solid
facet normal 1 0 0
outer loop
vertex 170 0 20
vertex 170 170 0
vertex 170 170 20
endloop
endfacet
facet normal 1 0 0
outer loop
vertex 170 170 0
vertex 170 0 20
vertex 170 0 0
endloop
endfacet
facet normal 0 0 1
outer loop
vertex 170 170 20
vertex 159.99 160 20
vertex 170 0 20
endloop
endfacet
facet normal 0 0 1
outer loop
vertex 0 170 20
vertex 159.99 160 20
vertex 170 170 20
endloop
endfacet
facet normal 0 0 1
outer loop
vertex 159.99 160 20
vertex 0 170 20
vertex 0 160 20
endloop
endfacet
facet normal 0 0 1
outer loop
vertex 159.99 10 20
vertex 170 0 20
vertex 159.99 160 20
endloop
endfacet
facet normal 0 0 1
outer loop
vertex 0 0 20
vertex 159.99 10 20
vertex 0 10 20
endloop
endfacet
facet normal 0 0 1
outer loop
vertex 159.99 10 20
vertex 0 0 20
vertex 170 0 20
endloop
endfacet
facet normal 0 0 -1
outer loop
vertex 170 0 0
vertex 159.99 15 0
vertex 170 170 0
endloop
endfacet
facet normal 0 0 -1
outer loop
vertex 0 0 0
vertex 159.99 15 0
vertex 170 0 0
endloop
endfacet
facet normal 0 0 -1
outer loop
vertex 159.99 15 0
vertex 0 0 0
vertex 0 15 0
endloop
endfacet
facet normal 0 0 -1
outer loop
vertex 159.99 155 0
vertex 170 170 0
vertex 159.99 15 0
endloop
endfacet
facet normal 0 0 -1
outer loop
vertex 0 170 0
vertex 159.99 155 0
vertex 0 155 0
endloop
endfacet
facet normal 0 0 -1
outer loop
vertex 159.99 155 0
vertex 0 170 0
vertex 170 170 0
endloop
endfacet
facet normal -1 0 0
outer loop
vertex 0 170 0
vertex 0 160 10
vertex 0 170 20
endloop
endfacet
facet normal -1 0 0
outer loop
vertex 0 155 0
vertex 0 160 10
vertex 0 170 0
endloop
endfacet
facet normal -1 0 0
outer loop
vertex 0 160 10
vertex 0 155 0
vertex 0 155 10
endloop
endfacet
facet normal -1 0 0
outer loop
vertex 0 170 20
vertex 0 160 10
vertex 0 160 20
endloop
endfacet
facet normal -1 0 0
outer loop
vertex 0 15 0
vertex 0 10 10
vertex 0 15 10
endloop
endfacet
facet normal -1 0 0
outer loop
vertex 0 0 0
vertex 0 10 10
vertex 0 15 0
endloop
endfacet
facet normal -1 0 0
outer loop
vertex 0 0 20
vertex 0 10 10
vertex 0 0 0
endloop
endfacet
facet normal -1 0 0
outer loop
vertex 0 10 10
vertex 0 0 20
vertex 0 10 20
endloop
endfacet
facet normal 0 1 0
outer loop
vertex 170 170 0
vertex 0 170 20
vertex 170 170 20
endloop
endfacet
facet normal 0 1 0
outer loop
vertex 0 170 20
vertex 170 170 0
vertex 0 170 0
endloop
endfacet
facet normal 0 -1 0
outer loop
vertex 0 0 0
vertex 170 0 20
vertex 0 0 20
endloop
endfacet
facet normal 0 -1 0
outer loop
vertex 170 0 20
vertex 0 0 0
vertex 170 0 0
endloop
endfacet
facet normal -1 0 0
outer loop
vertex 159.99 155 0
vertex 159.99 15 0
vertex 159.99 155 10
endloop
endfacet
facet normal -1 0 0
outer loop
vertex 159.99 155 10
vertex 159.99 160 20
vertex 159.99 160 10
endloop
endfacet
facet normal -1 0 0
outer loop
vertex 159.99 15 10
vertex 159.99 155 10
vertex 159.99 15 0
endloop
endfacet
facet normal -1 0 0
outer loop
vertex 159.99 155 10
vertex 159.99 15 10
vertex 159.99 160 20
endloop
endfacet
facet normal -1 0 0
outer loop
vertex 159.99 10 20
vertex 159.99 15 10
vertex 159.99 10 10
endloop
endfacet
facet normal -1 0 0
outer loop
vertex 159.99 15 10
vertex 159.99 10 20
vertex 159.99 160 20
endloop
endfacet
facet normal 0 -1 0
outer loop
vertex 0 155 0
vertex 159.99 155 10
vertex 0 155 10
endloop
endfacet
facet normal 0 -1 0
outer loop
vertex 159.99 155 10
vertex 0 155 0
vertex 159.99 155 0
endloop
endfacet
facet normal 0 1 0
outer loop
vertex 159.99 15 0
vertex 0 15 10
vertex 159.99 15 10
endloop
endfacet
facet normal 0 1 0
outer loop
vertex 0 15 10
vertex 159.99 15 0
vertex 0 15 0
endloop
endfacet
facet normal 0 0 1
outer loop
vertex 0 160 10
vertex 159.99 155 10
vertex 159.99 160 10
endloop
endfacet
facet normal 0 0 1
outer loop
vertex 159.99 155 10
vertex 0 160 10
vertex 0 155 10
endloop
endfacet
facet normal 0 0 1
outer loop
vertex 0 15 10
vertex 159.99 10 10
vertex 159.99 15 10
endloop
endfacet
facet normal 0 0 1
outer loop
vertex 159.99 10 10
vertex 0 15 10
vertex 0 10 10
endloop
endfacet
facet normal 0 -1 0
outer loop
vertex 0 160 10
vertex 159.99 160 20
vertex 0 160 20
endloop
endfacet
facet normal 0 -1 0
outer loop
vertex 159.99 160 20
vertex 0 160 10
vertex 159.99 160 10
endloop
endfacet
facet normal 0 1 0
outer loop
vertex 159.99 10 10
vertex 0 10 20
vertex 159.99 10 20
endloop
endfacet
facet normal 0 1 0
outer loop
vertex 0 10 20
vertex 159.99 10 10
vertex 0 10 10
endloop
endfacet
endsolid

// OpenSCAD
$fa = 1;
$fs = 0.04;

e = 0.01;


module film_holder_seat(
    external_width,
    external_depth,
    external_height,
    film_holder_width,
    film_holder_depth,
    film_holder_height
) {
    rabbet_width = film_holder_width;
    rabbet_depth = film_holder_depth + 10;
    rabbet_height = 4;

    difference() {
        // main outer dimension of the holder seat
        cube([external_width, external_depth, 20]);

        // cut away the slot that the film holder will rest in
        translate([-e, (external_depth - film_holder_depth) / 2, -e])
            cube([film_holder_width, film_holder_depth, external_height + e]);

        // cut away a rabbet around the film holder for springs
        translate([-e, (external_depth - rabbet_depth) / 2, film_holder_height])
            cube([rabbet_width, rabbet_depth, 20]);
    }
}

film_holder_seat(
    external_width = 170,
    external_depth = 170,
    external_height = 40,
    film_holder_width = 160,
    film_holder_depth = 140,
    film_holder_height = 10
);
